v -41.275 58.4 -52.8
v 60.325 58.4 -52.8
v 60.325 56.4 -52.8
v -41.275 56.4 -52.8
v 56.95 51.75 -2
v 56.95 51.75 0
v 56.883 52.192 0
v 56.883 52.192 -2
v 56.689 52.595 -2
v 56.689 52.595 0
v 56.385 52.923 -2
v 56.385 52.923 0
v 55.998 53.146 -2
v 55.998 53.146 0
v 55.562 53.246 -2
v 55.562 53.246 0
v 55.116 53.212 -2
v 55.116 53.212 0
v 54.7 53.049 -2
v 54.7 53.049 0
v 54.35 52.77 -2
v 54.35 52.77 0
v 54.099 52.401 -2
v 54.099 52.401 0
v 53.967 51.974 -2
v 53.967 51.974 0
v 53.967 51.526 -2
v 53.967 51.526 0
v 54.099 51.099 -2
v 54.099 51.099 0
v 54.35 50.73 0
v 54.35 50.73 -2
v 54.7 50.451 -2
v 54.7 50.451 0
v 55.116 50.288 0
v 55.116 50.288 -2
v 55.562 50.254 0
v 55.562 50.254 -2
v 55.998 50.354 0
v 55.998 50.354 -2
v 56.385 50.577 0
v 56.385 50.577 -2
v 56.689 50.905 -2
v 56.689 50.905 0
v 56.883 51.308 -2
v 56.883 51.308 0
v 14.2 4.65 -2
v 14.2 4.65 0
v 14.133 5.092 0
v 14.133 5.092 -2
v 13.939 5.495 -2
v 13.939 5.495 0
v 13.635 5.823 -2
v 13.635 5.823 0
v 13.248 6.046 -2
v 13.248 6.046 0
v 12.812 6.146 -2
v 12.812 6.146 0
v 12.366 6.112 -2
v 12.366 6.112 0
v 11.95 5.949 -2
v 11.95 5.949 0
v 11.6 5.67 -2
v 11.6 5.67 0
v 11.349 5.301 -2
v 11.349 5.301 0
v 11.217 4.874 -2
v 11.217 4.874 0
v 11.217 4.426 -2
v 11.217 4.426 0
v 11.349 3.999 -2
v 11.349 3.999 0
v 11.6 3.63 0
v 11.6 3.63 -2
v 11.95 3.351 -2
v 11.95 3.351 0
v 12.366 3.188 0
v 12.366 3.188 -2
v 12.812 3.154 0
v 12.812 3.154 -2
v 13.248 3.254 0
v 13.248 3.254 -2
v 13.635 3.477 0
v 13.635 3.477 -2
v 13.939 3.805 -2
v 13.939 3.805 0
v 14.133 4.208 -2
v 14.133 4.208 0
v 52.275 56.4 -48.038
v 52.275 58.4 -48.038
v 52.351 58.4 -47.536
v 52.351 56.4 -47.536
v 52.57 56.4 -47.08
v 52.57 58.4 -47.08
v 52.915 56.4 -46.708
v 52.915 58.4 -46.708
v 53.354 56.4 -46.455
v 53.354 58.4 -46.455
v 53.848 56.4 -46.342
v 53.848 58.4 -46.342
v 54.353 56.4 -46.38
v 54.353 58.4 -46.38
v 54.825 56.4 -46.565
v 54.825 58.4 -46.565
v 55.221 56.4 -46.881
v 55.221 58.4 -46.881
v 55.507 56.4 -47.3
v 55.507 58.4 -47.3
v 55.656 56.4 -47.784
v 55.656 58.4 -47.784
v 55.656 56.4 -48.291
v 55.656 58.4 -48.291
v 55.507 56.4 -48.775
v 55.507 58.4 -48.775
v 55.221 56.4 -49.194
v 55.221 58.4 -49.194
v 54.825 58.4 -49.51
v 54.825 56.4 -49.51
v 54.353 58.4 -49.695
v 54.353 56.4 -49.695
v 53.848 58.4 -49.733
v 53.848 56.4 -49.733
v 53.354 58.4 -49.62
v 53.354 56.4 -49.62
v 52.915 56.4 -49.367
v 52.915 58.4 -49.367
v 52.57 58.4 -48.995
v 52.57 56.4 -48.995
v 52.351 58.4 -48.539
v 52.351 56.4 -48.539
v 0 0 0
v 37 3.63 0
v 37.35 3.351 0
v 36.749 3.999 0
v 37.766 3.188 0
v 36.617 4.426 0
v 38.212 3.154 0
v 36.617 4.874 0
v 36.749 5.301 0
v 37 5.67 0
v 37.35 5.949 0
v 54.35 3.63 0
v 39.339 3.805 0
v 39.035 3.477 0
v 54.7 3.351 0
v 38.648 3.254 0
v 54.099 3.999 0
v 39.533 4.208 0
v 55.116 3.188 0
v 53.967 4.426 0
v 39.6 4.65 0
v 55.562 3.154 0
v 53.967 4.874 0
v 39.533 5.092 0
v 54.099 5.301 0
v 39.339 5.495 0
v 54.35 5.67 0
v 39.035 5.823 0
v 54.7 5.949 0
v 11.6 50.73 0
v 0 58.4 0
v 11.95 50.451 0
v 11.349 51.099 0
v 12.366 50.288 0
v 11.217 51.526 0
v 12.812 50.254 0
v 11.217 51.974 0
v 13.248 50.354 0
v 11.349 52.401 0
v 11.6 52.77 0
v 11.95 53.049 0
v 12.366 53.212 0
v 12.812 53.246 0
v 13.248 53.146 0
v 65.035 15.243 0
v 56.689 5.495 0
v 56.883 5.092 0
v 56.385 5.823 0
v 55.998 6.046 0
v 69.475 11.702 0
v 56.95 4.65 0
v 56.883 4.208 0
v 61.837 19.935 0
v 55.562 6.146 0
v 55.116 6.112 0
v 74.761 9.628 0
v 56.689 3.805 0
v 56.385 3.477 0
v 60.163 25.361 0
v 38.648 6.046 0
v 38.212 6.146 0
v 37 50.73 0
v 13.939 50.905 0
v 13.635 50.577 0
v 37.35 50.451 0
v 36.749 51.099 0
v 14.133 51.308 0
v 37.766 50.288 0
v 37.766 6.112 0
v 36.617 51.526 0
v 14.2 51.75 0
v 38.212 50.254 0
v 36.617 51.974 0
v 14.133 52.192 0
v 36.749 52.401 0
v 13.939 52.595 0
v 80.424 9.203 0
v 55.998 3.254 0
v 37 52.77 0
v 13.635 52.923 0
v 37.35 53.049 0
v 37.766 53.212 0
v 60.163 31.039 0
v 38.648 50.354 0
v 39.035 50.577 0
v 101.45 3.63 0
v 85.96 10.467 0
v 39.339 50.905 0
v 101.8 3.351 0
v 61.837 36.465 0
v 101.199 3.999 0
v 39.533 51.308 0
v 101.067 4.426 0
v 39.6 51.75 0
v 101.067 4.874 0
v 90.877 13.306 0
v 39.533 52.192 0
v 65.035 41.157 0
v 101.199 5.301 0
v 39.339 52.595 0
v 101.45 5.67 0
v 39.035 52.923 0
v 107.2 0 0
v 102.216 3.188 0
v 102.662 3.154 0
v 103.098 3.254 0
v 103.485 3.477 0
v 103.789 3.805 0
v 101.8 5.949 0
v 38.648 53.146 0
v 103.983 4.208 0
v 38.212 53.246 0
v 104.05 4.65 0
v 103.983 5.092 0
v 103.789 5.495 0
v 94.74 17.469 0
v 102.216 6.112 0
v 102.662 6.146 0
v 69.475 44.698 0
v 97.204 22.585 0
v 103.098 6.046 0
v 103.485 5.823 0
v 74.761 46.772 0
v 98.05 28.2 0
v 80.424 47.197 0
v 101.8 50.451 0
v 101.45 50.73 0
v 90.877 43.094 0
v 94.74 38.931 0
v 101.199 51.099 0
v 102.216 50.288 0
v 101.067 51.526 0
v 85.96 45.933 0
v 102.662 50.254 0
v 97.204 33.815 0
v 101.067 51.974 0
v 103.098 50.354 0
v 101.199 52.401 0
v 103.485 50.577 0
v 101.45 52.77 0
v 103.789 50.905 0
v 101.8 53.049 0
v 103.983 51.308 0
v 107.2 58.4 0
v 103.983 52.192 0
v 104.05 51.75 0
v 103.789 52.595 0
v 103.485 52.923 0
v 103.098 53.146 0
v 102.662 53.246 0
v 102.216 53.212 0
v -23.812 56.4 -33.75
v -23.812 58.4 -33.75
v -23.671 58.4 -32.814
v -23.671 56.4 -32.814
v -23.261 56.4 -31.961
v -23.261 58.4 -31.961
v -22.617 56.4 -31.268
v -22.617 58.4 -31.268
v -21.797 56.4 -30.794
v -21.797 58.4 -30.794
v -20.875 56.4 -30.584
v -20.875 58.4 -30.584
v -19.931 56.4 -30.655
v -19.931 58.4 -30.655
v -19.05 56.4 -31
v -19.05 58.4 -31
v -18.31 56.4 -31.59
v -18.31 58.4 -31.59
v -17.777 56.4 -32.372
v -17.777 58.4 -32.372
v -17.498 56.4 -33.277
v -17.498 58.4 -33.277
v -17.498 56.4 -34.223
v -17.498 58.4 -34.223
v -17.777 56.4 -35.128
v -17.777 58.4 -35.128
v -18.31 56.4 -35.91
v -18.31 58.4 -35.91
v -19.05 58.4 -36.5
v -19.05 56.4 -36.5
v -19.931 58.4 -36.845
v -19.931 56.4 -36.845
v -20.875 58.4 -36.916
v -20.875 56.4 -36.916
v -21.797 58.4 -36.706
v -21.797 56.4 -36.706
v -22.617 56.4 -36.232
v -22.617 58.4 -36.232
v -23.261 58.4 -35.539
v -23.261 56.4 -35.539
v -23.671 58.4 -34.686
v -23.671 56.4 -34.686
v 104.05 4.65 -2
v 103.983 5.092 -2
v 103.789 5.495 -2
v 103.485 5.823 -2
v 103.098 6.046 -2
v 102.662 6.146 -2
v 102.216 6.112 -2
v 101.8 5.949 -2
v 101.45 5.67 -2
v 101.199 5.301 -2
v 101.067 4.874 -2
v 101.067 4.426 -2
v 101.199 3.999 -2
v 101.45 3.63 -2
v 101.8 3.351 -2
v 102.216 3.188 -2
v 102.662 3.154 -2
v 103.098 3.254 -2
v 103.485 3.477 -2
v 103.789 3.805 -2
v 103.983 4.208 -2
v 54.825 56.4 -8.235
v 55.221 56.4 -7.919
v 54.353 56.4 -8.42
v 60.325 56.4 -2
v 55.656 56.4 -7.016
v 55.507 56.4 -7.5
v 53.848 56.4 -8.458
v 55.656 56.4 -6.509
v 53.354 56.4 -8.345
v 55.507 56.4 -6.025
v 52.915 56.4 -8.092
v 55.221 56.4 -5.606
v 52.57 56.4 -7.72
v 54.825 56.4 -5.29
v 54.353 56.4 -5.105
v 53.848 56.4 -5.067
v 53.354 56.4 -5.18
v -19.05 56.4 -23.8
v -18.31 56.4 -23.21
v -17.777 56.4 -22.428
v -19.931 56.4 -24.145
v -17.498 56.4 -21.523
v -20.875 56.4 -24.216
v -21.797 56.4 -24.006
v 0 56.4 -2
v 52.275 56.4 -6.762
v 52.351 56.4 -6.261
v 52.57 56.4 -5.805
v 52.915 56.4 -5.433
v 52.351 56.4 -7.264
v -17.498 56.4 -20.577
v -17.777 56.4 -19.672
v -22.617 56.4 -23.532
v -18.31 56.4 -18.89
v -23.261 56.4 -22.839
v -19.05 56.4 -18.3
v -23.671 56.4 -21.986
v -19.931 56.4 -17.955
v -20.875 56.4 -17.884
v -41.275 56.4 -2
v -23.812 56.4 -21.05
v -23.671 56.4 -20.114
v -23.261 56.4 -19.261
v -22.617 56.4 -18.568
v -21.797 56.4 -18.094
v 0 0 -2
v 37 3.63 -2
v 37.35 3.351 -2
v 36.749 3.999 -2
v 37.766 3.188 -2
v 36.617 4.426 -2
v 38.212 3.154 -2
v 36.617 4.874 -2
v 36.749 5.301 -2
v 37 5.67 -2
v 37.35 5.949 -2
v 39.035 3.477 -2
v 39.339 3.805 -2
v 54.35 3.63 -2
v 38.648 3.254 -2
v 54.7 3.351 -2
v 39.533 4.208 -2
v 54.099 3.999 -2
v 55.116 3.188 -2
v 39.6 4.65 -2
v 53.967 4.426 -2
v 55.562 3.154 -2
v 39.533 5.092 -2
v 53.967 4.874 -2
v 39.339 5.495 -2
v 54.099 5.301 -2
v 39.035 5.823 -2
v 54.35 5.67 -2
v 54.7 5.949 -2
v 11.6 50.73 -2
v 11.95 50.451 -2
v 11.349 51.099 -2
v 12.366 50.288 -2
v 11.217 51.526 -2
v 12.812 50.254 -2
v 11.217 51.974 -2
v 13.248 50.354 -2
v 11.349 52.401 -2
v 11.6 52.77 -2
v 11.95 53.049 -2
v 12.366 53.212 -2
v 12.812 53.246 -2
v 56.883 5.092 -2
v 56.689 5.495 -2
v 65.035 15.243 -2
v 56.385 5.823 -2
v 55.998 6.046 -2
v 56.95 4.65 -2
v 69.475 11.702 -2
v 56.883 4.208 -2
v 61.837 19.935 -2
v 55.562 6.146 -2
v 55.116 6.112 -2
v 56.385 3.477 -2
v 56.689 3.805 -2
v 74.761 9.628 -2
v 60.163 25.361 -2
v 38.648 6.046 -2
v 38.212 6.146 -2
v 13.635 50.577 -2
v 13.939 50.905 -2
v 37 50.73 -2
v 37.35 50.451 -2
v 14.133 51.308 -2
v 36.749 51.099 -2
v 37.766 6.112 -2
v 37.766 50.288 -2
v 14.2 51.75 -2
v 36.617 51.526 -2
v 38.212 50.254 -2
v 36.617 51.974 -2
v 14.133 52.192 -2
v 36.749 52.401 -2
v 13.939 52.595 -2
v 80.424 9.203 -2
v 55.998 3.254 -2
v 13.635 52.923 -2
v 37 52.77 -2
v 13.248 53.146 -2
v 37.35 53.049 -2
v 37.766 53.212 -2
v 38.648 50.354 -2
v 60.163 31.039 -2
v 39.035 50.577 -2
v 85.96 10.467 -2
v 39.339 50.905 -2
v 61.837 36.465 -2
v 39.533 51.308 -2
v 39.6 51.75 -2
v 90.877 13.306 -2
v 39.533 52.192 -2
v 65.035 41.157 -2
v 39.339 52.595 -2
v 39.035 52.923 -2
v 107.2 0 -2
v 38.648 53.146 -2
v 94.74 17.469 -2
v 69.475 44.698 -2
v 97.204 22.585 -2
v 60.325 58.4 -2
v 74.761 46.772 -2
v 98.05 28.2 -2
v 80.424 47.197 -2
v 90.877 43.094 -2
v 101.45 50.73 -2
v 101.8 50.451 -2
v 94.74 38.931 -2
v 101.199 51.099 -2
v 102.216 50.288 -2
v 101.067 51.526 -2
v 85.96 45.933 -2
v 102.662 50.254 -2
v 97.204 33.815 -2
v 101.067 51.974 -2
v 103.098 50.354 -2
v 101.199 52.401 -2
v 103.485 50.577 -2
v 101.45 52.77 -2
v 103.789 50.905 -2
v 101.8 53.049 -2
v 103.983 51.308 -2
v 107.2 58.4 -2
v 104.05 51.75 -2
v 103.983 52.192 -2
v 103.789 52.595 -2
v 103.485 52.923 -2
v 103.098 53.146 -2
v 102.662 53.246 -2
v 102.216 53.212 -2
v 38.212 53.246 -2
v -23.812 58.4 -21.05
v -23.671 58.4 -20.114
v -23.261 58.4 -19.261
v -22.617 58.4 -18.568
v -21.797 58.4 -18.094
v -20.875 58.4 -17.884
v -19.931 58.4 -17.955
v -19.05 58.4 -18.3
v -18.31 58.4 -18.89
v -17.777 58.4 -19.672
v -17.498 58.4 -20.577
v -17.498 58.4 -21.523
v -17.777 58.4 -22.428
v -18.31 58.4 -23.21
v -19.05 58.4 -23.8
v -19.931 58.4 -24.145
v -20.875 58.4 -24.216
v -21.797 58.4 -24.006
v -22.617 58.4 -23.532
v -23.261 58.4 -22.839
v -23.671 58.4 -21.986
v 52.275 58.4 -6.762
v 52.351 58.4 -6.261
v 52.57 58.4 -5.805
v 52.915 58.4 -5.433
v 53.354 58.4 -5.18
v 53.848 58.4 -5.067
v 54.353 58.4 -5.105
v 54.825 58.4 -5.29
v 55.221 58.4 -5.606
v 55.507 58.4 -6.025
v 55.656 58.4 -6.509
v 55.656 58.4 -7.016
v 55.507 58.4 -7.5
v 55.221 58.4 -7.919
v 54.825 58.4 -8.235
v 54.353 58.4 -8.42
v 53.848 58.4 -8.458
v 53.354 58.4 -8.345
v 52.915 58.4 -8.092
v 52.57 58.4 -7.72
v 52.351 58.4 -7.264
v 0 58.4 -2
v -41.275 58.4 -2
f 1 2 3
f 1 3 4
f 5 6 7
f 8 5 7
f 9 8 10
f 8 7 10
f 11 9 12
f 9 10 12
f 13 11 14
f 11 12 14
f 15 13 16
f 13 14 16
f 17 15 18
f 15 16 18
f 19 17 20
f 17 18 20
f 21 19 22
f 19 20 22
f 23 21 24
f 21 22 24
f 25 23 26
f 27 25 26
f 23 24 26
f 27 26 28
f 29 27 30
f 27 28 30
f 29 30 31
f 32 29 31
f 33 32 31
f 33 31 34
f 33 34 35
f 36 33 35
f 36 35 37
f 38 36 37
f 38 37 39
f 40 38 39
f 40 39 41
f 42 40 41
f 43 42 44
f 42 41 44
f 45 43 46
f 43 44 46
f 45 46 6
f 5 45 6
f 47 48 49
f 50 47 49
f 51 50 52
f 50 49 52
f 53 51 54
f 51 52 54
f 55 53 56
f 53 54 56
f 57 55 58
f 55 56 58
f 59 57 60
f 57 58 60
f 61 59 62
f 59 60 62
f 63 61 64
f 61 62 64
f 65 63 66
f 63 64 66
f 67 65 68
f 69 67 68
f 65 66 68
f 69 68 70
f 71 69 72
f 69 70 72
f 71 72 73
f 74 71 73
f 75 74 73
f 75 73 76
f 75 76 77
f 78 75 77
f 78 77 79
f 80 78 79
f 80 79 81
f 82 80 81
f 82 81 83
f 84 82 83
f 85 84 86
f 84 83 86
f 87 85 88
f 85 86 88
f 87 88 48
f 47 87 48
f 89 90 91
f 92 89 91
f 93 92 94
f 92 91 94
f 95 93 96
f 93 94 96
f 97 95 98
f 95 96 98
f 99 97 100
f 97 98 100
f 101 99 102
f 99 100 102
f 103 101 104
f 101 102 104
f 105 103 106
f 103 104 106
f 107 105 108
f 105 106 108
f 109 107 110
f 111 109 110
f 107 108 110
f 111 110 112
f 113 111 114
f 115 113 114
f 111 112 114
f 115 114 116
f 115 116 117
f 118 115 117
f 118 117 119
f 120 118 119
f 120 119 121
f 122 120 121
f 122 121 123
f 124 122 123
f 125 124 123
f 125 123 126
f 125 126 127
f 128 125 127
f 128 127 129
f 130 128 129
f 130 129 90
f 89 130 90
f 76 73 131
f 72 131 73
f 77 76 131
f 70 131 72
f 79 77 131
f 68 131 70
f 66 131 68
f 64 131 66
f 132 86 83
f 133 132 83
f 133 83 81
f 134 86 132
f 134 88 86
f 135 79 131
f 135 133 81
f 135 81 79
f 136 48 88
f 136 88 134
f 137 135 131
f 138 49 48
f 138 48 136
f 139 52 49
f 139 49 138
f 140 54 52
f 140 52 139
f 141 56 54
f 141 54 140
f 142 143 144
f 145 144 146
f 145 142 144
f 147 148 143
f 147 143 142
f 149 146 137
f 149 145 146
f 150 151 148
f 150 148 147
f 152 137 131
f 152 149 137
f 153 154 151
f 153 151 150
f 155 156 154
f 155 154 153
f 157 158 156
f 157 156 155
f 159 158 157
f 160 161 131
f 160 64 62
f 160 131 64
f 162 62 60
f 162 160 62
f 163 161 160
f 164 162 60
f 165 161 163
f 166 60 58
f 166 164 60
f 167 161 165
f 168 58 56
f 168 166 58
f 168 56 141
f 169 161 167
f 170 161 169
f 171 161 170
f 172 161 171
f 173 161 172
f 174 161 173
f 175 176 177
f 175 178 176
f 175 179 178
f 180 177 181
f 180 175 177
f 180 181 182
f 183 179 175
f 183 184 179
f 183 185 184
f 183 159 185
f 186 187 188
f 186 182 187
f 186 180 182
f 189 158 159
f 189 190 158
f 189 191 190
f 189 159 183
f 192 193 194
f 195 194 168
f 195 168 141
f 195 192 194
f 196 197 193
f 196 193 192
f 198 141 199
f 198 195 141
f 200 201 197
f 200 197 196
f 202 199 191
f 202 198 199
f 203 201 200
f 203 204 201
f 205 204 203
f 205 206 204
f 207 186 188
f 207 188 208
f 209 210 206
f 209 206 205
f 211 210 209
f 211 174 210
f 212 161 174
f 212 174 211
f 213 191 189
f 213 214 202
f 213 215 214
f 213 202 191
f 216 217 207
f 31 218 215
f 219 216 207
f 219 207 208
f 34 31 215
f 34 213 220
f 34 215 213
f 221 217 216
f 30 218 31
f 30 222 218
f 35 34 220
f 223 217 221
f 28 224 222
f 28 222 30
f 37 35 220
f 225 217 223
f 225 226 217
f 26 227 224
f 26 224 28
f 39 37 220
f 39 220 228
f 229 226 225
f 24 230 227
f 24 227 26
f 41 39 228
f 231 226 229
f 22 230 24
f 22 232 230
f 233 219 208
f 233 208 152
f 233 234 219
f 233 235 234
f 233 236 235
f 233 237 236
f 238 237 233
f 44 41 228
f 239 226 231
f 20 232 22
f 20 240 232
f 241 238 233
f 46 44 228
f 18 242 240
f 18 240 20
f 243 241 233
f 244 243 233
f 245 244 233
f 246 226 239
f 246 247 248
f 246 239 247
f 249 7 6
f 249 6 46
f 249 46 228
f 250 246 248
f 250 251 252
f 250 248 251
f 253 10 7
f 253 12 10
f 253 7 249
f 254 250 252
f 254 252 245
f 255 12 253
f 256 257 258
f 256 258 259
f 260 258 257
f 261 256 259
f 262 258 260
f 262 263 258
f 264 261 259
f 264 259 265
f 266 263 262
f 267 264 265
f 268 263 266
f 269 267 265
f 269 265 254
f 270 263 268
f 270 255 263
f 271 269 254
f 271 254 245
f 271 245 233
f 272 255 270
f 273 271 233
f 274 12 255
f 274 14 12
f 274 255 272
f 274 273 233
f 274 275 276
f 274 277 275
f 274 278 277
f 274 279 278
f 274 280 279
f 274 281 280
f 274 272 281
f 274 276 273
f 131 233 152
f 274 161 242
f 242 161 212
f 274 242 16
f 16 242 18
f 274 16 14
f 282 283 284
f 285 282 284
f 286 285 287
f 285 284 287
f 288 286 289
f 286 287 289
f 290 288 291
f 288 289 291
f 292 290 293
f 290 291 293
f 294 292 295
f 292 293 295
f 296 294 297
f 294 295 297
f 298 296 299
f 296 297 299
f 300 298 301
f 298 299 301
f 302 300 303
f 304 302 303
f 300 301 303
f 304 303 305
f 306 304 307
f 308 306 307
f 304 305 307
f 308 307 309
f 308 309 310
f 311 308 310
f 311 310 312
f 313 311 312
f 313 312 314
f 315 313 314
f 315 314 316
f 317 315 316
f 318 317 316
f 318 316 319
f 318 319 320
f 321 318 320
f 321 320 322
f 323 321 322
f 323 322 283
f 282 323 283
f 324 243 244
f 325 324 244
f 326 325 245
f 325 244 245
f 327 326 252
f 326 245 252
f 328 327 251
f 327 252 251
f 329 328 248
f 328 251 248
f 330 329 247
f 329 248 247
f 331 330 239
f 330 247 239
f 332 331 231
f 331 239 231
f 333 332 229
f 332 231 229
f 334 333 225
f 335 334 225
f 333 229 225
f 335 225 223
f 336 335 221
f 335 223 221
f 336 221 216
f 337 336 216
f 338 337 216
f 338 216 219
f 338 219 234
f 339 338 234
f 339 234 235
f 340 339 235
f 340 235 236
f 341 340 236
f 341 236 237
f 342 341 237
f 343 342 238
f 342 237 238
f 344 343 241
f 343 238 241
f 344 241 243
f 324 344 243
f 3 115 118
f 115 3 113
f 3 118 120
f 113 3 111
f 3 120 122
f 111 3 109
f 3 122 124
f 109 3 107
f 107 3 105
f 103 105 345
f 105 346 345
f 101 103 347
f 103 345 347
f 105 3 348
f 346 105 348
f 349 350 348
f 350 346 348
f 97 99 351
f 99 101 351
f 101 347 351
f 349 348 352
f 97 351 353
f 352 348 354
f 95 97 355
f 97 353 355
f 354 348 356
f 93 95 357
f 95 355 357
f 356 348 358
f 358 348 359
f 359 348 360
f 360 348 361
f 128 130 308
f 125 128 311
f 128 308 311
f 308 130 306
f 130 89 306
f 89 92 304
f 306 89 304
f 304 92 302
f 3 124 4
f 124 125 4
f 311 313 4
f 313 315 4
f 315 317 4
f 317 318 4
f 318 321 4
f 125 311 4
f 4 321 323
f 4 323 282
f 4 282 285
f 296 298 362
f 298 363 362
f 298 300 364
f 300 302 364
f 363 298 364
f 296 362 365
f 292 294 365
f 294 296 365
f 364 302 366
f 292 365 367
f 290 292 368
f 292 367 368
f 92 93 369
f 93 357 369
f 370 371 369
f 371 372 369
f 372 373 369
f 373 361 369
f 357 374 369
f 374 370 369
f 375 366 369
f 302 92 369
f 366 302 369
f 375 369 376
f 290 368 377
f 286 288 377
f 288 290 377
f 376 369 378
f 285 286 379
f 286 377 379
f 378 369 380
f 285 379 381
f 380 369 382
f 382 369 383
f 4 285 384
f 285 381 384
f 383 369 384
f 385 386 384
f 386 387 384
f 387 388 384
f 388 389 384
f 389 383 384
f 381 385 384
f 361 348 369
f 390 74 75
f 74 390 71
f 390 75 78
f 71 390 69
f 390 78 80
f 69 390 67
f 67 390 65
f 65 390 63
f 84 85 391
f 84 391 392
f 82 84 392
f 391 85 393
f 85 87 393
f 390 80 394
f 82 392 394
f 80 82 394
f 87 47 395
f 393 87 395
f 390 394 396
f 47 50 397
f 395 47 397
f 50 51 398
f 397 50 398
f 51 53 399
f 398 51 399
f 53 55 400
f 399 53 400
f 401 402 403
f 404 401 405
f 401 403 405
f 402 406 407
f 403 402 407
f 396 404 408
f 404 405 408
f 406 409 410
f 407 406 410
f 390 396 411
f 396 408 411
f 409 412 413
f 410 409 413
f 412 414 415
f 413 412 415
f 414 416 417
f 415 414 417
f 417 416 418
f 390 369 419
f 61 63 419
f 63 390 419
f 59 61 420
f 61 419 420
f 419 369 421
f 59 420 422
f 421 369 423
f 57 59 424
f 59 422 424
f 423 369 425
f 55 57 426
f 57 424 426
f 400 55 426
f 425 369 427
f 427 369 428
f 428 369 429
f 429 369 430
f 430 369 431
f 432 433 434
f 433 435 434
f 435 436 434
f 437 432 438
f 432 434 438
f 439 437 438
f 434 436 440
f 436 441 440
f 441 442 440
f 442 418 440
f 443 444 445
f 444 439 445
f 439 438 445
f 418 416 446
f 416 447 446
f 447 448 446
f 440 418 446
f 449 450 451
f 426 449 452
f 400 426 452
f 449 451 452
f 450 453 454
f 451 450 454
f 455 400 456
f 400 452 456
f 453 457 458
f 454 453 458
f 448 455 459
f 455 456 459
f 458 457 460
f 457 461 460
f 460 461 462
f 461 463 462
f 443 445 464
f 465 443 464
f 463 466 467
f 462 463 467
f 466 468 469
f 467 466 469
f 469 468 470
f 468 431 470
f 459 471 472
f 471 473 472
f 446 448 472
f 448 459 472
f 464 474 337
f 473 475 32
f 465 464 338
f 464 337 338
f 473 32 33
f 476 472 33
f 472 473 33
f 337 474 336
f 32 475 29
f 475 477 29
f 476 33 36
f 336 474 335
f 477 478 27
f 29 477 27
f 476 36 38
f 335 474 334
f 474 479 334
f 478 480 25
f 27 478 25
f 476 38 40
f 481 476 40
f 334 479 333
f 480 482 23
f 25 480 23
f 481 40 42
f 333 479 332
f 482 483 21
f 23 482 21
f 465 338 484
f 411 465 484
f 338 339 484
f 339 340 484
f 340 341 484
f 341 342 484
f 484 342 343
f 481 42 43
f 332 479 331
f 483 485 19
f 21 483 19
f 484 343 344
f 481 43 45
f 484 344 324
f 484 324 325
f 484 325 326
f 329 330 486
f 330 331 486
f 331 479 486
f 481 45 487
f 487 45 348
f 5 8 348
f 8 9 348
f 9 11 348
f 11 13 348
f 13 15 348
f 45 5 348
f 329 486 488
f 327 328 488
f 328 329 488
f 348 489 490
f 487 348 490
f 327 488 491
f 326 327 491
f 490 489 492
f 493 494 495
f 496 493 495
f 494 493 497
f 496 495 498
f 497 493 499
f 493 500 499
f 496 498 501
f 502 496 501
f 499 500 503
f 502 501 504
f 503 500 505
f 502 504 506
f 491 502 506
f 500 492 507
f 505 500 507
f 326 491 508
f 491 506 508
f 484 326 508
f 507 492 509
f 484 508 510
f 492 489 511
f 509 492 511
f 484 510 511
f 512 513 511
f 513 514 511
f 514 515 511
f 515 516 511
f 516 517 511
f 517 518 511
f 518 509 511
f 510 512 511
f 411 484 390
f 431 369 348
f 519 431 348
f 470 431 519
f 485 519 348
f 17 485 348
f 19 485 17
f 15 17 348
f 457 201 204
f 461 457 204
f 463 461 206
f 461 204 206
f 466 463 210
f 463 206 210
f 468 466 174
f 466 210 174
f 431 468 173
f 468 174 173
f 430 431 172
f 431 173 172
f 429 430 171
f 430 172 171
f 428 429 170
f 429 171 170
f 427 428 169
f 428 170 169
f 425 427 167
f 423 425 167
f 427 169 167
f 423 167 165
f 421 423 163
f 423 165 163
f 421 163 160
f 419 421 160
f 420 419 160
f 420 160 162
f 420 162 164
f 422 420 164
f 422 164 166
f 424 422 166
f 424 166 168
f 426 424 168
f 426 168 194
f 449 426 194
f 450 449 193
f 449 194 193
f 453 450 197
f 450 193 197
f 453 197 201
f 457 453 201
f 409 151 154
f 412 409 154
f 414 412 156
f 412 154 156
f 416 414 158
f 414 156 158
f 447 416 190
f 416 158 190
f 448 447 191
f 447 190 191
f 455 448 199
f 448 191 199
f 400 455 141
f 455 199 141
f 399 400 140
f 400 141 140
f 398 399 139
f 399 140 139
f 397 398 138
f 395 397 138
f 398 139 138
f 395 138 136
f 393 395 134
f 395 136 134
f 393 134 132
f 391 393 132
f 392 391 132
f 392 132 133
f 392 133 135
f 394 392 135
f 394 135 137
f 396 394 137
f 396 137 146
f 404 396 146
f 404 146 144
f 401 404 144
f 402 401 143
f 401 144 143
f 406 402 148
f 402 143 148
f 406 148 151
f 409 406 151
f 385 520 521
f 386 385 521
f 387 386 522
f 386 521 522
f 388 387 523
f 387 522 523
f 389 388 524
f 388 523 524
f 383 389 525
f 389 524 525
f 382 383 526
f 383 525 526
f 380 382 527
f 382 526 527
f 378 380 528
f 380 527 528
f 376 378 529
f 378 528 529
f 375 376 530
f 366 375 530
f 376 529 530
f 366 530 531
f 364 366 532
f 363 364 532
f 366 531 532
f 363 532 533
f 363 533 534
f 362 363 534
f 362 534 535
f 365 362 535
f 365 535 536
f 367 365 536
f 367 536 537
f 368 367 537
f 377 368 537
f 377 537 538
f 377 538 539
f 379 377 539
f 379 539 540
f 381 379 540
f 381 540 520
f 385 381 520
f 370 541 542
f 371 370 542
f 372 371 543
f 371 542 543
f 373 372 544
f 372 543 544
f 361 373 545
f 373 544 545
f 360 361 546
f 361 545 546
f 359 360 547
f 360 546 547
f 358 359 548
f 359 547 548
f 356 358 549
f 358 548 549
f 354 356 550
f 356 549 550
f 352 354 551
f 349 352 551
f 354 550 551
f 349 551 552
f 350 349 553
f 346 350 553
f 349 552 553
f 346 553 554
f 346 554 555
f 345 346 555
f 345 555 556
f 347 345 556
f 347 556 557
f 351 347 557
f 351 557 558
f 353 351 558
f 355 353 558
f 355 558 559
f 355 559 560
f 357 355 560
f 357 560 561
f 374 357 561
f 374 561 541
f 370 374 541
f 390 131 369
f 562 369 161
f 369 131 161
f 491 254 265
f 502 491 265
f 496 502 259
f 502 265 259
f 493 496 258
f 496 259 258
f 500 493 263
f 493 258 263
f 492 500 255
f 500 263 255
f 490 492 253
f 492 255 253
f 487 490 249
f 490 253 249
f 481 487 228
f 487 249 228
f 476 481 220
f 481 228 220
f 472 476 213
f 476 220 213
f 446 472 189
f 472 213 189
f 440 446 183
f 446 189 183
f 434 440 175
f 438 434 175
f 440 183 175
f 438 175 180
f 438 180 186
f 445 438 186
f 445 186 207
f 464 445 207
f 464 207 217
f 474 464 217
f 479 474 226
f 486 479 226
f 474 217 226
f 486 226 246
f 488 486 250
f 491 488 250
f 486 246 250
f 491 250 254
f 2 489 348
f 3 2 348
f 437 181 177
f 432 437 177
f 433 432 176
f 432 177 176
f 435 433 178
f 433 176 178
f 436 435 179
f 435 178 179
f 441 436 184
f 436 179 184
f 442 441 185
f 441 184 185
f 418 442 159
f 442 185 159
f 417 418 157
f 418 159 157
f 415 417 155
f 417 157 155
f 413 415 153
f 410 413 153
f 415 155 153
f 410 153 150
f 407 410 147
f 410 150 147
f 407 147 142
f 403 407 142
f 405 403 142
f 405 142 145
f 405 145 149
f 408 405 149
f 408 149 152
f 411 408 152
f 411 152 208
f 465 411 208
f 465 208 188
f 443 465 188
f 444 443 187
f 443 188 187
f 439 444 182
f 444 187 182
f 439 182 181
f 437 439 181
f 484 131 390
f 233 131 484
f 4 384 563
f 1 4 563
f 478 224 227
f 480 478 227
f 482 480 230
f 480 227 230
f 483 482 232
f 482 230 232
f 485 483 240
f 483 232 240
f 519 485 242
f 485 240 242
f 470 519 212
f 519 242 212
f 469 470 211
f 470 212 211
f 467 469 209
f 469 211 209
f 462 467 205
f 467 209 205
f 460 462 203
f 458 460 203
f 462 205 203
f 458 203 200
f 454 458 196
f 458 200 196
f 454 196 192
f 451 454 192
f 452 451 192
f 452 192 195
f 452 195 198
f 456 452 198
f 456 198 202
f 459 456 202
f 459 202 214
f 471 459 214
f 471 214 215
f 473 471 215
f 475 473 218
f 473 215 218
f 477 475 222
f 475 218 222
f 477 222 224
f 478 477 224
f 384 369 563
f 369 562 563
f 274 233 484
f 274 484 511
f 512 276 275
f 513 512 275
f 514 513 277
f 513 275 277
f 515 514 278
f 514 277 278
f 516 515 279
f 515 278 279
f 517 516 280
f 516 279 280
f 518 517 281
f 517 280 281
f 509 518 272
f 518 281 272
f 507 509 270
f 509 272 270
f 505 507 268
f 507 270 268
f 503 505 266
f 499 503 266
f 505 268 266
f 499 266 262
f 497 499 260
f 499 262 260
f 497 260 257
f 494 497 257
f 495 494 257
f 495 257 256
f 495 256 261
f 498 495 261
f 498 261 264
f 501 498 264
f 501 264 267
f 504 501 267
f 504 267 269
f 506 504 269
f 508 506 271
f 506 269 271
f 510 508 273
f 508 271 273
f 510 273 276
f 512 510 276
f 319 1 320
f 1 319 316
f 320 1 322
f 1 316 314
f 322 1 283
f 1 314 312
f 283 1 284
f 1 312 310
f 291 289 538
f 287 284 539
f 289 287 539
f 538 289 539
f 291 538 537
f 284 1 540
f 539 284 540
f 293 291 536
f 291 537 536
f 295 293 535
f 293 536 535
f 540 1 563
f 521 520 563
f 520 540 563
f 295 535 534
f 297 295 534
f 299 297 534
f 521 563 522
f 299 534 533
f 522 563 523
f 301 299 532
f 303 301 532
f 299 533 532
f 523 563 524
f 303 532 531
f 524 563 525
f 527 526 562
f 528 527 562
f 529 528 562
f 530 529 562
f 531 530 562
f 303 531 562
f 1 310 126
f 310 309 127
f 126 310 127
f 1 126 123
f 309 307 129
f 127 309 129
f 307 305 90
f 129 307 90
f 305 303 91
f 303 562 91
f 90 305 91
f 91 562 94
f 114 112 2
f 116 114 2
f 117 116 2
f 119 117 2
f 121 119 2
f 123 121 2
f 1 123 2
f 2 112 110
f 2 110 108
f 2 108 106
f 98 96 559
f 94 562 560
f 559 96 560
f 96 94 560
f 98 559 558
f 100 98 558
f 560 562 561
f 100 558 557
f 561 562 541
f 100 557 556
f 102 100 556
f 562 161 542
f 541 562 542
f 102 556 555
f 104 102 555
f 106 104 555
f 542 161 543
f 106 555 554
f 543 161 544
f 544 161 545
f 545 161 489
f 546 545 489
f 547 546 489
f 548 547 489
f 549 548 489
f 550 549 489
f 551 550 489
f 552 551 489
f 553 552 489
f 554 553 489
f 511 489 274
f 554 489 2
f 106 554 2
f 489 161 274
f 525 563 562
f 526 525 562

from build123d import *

# Parameters (mm, degrees)
SKETCH1_W           = 107.2
SKETCH1_H           = 58.4
SKETCH1_R           = 1.5
SKETCH1_R_2         = 19.05
BOSS_EXTRUDE1_DEPTH = 2
BOSS_EXTRUDE2_DEPTH = 50.8
SKETCH3_R           = 1.7
SKETCH3_R_2         = 3.175
CUT_EXTRUDE1_DEPTH  = 134.004661572


with BuildPart() as part:
    # Sketch1 → Boss-Extrude1 (new body)
    with BuildSketch(Plane.XY):
        with Locations((53.6, 29.2)):
            Rectangle(SKETCH1_W, SKETCH1_H)
        with Locations((102.55, 51.75)):
            Circle(SKETCH1_R, mode=Mode.SUBTRACT)
        with Locations((102.55, 4.65)):
            Circle(SKETCH1_R, mode=Mode.SUBTRACT)
        with Locations((55.45, 4.65)):
            Circle(SKETCH1_R, mode=Mode.SUBTRACT)
        with Locations((55.45, 51.75)):
            Circle(SKETCH1_R, mode=Mode.SUBTRACT)
        with Locations((12.7, 51.75)):
            Circle(SKETCH1_R, mode=Mode.SUBTRACT)
        with Locations((38.1, 51.75)):
            Circle(SKETCH1_R, mode=Mode.SUBTRACT)
        with Locations((12.7, 4.65)):
            Circle(SKETCH1_R, mode=Mode.SUBTRACT)
        with Locations((38.1, 4.65)):
            Circle(SKETCH1_R, mode=Mode.SUBTRACT)
        with Locations((79, 28.2)):
            Circle(SKETCH1_R_2, mode=Mode.SUBTRACT)
    extrude(amount=-BOSS_EXTRUDE1_DEPTH)

    # Sketch2 → Boss-Extrude2 (add)
    with BuildSketch(Plane(origin=(0, 0, -2), x_dir=(-1, 0, 0), z_dir=(0, 0, -1))):
        Polygon((0, 56.4), (41.275, 56.4), (41.275, 58.4), (0, 58.4), (-60.325, 58.4), (-60.325, 56.4), align=None)
    extrude(amount=BOSS_EXTRUDE2_DEPTH)

    # Sketch3 → Cut-Extrude1 (cut, through all)
    with BuildSketch(Plane(origin=(0, 58.4, 0), x_dir=(1, 0, 0), z_dir=(0, 1, 0))):
        with Locations(Location((53.975, 48.0375, 0), (0, 0, 180))):
            Circle(SKETCH3_R)
        with Locations(Location((53.975, 6.7625, 0), (0, 0, 180))):
            Circle(SKETCH3_R)
        with Locations(Location((-20.6375, 33.75, 0), (0, 0, 180))):
            Circle(SKETCH3_R_2)
        with Locations(Location((-20.6375, 21.05, 0), (0, 0, 180))):
            Circle(SKETCH3_R_2)
    extrude(amount=-CUT_EXTRUDE1_DEPTH, mode=Mode.SUBTRACT)


solid = part.part
